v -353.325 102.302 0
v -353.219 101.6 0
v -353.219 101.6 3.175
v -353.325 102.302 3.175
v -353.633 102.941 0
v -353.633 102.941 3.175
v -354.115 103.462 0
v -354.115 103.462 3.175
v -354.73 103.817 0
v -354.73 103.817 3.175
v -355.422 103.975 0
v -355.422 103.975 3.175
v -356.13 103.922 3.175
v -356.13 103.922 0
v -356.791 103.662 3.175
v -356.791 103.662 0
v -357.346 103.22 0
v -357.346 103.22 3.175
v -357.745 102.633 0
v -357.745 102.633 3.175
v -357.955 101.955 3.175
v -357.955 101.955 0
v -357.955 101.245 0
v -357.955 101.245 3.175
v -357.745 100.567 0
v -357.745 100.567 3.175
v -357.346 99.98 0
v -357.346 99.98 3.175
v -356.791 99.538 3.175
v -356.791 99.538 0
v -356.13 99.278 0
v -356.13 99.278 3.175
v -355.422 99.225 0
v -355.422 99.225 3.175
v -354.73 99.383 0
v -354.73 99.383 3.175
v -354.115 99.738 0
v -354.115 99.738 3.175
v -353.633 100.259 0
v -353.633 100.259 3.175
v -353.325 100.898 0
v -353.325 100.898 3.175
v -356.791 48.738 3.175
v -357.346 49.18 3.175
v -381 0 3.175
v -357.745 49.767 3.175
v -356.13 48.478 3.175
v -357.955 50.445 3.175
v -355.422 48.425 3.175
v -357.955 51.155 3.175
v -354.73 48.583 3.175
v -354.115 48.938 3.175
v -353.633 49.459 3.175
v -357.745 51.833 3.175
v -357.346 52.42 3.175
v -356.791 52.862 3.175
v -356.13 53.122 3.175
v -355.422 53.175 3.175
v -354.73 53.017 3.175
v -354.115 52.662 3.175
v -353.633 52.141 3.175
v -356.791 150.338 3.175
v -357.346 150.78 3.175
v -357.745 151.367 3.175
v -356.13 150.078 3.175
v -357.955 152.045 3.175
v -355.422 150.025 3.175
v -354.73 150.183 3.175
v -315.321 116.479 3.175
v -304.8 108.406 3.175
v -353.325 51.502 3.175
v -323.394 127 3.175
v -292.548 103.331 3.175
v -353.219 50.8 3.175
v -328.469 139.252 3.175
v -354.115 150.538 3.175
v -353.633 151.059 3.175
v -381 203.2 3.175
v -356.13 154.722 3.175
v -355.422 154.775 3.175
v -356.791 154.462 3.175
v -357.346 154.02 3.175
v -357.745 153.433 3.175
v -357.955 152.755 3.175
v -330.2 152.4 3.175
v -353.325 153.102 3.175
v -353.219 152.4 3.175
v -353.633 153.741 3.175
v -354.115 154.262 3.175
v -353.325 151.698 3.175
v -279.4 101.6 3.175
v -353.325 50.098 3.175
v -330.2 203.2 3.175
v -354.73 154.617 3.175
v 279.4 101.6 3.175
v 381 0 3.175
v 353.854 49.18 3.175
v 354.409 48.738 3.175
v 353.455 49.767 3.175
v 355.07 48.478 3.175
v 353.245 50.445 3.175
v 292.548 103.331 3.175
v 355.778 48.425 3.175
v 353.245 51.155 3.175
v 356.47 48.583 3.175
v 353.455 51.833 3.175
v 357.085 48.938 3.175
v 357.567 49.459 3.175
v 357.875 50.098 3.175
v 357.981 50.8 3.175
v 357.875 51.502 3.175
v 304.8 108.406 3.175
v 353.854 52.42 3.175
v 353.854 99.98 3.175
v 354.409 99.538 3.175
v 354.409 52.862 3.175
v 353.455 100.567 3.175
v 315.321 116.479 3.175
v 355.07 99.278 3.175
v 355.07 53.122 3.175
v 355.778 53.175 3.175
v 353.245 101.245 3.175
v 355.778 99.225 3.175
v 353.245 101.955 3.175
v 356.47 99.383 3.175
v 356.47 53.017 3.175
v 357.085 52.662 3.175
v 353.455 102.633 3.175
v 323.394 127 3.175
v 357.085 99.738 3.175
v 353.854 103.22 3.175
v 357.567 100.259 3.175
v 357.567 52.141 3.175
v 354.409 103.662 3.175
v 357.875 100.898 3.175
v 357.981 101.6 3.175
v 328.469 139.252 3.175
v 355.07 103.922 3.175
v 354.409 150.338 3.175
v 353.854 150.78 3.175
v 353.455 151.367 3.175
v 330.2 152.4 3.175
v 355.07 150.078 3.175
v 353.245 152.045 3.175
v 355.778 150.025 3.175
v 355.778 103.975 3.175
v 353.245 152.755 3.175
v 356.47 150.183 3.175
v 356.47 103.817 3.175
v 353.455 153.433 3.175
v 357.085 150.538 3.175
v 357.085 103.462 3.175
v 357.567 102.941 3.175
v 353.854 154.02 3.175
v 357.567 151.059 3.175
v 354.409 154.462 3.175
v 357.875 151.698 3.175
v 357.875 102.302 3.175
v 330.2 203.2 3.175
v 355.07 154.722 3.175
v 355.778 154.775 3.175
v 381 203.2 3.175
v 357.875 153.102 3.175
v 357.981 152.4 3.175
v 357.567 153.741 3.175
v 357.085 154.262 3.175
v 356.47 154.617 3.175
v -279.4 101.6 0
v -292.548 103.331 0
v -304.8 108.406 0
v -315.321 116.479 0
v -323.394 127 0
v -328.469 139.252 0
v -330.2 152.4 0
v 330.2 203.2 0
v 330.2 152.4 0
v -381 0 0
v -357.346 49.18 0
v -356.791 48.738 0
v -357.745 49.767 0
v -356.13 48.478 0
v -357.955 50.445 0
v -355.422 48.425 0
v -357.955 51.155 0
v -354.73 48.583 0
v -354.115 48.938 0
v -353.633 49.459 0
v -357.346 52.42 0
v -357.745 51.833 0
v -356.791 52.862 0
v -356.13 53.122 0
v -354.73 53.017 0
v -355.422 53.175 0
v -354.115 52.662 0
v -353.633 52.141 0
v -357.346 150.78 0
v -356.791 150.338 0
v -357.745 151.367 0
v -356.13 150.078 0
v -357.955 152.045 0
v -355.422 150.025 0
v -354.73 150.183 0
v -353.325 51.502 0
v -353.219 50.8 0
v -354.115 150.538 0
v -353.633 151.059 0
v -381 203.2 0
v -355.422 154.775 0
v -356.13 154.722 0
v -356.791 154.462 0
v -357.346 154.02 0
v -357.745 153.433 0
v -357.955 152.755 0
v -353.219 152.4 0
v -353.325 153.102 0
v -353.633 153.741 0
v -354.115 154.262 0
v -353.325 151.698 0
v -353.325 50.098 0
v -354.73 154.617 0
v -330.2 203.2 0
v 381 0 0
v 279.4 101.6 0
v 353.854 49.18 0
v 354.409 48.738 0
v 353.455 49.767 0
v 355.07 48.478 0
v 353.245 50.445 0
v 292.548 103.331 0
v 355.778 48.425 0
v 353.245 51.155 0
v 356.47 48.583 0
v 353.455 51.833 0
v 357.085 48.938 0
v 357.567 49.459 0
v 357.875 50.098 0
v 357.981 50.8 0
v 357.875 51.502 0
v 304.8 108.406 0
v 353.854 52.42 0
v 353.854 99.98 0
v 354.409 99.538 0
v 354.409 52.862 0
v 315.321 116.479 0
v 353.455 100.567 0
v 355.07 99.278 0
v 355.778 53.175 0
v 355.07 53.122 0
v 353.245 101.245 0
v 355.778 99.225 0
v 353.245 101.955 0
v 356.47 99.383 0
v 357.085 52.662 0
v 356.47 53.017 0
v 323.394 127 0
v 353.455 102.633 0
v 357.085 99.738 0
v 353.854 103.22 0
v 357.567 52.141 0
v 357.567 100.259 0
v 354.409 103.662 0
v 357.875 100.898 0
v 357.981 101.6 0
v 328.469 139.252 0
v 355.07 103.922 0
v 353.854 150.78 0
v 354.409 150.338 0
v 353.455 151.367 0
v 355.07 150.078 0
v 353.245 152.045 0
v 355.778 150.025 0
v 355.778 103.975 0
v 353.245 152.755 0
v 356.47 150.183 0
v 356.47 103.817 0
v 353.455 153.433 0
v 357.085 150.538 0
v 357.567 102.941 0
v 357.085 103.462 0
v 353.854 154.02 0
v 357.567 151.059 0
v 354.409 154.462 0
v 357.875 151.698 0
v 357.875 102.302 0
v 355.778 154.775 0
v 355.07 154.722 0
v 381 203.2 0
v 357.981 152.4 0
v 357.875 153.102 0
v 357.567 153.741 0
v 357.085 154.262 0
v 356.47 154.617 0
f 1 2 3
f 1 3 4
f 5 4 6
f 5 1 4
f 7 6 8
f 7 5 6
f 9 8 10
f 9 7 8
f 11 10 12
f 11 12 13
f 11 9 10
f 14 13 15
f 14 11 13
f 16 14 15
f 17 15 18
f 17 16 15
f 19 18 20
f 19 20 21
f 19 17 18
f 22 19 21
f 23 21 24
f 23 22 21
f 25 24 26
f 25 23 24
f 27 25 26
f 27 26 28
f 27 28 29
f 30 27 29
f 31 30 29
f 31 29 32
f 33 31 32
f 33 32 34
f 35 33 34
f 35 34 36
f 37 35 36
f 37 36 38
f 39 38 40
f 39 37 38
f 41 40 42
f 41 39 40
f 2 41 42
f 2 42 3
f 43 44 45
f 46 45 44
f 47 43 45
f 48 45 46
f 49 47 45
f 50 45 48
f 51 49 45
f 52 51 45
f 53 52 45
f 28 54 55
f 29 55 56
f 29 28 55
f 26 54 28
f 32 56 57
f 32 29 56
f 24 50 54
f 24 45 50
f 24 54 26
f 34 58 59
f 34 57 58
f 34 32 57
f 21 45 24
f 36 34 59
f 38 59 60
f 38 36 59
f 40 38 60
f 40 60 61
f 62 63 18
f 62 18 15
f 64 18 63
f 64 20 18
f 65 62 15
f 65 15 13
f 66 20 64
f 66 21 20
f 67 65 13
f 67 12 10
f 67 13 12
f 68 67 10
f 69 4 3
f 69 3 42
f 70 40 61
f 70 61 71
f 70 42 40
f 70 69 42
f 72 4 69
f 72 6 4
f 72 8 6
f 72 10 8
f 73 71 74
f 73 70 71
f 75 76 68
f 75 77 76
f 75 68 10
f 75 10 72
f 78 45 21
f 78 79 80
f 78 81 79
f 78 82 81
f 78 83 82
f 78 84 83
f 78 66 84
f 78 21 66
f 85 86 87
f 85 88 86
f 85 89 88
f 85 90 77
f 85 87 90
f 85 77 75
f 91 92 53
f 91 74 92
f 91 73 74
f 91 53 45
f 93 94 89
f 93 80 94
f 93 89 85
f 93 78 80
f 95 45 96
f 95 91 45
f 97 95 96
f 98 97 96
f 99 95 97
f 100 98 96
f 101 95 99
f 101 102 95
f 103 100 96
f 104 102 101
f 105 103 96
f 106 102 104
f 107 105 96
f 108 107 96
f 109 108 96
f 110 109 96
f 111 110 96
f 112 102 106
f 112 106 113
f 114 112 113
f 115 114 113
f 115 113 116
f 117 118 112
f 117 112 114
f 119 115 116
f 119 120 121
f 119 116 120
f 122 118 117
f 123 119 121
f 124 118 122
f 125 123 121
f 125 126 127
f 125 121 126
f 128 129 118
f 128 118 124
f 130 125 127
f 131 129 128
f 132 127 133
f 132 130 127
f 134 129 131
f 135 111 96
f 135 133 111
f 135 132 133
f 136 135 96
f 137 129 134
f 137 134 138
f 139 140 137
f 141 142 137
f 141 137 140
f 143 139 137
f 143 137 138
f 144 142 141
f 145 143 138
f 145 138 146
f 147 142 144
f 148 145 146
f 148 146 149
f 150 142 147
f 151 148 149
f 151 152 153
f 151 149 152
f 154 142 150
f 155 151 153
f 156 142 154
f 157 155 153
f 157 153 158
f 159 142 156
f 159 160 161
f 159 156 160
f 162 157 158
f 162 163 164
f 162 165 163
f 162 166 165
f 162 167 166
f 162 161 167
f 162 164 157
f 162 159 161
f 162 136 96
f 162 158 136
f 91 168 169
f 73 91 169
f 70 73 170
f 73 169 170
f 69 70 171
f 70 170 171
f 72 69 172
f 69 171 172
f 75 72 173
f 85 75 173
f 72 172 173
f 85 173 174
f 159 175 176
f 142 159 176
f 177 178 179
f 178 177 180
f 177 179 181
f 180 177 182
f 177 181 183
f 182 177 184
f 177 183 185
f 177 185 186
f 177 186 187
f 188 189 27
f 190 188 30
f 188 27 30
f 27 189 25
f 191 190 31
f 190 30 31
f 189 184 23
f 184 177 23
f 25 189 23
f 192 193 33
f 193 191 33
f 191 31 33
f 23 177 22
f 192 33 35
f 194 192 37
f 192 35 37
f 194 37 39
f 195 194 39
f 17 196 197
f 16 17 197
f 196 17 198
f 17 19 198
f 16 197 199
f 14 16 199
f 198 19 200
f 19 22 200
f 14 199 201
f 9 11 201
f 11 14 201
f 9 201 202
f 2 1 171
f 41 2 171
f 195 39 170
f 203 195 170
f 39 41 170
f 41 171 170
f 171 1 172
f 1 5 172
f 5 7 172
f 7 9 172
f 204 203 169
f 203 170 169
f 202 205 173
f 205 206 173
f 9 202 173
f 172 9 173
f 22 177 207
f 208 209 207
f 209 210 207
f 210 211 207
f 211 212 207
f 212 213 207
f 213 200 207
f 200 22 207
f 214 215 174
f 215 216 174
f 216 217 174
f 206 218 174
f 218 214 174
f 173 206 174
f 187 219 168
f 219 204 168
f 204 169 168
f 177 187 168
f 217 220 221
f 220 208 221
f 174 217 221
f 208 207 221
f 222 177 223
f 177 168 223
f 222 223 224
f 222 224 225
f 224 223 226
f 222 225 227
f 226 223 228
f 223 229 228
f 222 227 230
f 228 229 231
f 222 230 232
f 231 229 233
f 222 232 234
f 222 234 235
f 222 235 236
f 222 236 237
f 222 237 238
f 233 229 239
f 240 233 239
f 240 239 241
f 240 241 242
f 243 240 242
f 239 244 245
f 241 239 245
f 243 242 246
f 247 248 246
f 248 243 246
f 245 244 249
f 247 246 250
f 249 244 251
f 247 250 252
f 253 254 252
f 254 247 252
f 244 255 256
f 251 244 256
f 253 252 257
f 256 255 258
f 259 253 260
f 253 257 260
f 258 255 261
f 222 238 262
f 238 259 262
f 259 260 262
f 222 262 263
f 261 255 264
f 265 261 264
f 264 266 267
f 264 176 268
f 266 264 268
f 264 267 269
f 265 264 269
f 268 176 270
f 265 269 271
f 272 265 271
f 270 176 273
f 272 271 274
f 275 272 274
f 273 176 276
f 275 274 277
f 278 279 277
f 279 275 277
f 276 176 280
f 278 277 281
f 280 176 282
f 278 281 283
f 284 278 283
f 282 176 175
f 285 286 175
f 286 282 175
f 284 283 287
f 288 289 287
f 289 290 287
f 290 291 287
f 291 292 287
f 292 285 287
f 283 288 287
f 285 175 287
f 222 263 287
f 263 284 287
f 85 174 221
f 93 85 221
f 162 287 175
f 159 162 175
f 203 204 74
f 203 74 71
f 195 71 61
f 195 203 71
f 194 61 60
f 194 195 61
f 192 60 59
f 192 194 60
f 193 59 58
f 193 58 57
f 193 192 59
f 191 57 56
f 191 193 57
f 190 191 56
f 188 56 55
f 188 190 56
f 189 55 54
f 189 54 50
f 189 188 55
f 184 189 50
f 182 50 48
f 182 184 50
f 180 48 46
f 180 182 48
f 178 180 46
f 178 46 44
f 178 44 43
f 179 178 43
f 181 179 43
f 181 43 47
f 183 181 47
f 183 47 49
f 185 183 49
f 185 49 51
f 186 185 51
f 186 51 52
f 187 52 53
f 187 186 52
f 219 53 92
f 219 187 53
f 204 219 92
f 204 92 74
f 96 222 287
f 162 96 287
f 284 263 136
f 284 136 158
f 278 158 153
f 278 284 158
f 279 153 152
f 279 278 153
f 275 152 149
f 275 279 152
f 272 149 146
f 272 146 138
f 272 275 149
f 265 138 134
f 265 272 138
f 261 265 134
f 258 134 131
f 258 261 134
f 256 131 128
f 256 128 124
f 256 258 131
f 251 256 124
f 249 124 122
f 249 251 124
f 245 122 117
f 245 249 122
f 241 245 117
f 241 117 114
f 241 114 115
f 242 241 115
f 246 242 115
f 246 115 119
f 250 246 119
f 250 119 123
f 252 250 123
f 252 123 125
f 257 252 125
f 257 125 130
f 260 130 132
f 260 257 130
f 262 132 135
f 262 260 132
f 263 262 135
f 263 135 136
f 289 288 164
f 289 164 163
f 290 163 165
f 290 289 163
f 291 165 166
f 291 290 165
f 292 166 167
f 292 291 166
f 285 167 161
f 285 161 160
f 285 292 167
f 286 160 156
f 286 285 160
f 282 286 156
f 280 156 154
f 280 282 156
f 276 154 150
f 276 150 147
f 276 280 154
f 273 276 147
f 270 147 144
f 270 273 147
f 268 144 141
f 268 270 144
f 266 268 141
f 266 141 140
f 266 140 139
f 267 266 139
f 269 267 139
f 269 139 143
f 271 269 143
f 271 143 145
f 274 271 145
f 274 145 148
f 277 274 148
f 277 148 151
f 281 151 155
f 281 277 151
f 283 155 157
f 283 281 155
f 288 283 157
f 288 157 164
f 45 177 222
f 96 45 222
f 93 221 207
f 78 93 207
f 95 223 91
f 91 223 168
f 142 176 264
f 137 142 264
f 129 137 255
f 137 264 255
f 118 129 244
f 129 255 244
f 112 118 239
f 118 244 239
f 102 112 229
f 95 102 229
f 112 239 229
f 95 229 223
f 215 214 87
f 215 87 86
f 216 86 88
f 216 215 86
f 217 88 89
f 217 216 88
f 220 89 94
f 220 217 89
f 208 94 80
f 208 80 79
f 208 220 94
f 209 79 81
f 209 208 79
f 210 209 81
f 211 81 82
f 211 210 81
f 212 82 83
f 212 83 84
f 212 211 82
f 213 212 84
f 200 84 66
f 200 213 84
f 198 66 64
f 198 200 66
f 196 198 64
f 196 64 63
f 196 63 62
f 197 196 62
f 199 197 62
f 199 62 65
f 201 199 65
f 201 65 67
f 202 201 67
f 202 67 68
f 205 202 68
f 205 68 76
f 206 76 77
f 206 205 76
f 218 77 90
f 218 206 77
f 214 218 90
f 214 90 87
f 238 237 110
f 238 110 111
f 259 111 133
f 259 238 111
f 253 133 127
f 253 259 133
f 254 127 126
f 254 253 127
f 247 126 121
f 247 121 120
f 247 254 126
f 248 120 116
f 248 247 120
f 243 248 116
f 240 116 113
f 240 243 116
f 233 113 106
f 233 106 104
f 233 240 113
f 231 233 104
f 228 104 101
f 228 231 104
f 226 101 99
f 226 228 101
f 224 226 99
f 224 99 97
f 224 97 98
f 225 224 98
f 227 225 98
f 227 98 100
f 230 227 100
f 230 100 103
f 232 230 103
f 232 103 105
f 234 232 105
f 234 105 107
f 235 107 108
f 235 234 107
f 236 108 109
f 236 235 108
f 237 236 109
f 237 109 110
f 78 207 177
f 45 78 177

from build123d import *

# Parameters (mm, degrees)
SKETCH1_R           = 2.38125
BOSS_EXTRUDE1_DEPTH = 3.175


with BuildPart() as part:
    # Sketch1 → Boss-Extrude1 (new body)
    with BuildSketch(Plane.XY):
        with BuildLine():
            Line((-381, 0), (381, 0))
            Line((381, 0), (381, 203.2))
            Line((381, 203.2), (330.2, 203.2))
            Line((330.2, 203.2), (330.2, 152.4))
            ThreePointArc((330.2, 152.4), (315.321024484, 116.478975516), (279.4, 101.6))
            Line((279.4, 101.6), (-279.4, 101.6))
            ThreePointArc((-279.4, 101.6), (-315.321024484, 116.478975516), (-330.2, 152.4))
            Line((-330.2, 152.4), (-330.2, 203.2))
            Line((-330.2, 203.2), (-381, 203.2))
            Line((-381, 203.2), (-381, 0))
        make_face()
        with Locations((-355.6, 152.4)):
            Circle(SKETCH1_R, mode=Mode.SUBTRACT)
        with Locations((355.6, 152.4)):
            Circle(SKETCH1_R, mode=Mode.SUBTRACT)
        with Locations((355.6, 101.6)):
            Circle(SKETCH1_R, mode=Mode.SUBTRACT)
        with Locations((355.6, 50.8)):
            Circle(SKETCH1_R, mode=Mode.SUBTRACT)
        with Locations((-355.6, 101.6)):
            Circle(SKETCH1_R, mode=Mode.SUBTRACT)
        with Locations((-355.6, 50.8)):
            Circle(SKETCH1_R, mode=Mode.SUBTRACT)
    extrude(amount=BOSS_EXTRUDE1_DEPTH)


solid = part.part
